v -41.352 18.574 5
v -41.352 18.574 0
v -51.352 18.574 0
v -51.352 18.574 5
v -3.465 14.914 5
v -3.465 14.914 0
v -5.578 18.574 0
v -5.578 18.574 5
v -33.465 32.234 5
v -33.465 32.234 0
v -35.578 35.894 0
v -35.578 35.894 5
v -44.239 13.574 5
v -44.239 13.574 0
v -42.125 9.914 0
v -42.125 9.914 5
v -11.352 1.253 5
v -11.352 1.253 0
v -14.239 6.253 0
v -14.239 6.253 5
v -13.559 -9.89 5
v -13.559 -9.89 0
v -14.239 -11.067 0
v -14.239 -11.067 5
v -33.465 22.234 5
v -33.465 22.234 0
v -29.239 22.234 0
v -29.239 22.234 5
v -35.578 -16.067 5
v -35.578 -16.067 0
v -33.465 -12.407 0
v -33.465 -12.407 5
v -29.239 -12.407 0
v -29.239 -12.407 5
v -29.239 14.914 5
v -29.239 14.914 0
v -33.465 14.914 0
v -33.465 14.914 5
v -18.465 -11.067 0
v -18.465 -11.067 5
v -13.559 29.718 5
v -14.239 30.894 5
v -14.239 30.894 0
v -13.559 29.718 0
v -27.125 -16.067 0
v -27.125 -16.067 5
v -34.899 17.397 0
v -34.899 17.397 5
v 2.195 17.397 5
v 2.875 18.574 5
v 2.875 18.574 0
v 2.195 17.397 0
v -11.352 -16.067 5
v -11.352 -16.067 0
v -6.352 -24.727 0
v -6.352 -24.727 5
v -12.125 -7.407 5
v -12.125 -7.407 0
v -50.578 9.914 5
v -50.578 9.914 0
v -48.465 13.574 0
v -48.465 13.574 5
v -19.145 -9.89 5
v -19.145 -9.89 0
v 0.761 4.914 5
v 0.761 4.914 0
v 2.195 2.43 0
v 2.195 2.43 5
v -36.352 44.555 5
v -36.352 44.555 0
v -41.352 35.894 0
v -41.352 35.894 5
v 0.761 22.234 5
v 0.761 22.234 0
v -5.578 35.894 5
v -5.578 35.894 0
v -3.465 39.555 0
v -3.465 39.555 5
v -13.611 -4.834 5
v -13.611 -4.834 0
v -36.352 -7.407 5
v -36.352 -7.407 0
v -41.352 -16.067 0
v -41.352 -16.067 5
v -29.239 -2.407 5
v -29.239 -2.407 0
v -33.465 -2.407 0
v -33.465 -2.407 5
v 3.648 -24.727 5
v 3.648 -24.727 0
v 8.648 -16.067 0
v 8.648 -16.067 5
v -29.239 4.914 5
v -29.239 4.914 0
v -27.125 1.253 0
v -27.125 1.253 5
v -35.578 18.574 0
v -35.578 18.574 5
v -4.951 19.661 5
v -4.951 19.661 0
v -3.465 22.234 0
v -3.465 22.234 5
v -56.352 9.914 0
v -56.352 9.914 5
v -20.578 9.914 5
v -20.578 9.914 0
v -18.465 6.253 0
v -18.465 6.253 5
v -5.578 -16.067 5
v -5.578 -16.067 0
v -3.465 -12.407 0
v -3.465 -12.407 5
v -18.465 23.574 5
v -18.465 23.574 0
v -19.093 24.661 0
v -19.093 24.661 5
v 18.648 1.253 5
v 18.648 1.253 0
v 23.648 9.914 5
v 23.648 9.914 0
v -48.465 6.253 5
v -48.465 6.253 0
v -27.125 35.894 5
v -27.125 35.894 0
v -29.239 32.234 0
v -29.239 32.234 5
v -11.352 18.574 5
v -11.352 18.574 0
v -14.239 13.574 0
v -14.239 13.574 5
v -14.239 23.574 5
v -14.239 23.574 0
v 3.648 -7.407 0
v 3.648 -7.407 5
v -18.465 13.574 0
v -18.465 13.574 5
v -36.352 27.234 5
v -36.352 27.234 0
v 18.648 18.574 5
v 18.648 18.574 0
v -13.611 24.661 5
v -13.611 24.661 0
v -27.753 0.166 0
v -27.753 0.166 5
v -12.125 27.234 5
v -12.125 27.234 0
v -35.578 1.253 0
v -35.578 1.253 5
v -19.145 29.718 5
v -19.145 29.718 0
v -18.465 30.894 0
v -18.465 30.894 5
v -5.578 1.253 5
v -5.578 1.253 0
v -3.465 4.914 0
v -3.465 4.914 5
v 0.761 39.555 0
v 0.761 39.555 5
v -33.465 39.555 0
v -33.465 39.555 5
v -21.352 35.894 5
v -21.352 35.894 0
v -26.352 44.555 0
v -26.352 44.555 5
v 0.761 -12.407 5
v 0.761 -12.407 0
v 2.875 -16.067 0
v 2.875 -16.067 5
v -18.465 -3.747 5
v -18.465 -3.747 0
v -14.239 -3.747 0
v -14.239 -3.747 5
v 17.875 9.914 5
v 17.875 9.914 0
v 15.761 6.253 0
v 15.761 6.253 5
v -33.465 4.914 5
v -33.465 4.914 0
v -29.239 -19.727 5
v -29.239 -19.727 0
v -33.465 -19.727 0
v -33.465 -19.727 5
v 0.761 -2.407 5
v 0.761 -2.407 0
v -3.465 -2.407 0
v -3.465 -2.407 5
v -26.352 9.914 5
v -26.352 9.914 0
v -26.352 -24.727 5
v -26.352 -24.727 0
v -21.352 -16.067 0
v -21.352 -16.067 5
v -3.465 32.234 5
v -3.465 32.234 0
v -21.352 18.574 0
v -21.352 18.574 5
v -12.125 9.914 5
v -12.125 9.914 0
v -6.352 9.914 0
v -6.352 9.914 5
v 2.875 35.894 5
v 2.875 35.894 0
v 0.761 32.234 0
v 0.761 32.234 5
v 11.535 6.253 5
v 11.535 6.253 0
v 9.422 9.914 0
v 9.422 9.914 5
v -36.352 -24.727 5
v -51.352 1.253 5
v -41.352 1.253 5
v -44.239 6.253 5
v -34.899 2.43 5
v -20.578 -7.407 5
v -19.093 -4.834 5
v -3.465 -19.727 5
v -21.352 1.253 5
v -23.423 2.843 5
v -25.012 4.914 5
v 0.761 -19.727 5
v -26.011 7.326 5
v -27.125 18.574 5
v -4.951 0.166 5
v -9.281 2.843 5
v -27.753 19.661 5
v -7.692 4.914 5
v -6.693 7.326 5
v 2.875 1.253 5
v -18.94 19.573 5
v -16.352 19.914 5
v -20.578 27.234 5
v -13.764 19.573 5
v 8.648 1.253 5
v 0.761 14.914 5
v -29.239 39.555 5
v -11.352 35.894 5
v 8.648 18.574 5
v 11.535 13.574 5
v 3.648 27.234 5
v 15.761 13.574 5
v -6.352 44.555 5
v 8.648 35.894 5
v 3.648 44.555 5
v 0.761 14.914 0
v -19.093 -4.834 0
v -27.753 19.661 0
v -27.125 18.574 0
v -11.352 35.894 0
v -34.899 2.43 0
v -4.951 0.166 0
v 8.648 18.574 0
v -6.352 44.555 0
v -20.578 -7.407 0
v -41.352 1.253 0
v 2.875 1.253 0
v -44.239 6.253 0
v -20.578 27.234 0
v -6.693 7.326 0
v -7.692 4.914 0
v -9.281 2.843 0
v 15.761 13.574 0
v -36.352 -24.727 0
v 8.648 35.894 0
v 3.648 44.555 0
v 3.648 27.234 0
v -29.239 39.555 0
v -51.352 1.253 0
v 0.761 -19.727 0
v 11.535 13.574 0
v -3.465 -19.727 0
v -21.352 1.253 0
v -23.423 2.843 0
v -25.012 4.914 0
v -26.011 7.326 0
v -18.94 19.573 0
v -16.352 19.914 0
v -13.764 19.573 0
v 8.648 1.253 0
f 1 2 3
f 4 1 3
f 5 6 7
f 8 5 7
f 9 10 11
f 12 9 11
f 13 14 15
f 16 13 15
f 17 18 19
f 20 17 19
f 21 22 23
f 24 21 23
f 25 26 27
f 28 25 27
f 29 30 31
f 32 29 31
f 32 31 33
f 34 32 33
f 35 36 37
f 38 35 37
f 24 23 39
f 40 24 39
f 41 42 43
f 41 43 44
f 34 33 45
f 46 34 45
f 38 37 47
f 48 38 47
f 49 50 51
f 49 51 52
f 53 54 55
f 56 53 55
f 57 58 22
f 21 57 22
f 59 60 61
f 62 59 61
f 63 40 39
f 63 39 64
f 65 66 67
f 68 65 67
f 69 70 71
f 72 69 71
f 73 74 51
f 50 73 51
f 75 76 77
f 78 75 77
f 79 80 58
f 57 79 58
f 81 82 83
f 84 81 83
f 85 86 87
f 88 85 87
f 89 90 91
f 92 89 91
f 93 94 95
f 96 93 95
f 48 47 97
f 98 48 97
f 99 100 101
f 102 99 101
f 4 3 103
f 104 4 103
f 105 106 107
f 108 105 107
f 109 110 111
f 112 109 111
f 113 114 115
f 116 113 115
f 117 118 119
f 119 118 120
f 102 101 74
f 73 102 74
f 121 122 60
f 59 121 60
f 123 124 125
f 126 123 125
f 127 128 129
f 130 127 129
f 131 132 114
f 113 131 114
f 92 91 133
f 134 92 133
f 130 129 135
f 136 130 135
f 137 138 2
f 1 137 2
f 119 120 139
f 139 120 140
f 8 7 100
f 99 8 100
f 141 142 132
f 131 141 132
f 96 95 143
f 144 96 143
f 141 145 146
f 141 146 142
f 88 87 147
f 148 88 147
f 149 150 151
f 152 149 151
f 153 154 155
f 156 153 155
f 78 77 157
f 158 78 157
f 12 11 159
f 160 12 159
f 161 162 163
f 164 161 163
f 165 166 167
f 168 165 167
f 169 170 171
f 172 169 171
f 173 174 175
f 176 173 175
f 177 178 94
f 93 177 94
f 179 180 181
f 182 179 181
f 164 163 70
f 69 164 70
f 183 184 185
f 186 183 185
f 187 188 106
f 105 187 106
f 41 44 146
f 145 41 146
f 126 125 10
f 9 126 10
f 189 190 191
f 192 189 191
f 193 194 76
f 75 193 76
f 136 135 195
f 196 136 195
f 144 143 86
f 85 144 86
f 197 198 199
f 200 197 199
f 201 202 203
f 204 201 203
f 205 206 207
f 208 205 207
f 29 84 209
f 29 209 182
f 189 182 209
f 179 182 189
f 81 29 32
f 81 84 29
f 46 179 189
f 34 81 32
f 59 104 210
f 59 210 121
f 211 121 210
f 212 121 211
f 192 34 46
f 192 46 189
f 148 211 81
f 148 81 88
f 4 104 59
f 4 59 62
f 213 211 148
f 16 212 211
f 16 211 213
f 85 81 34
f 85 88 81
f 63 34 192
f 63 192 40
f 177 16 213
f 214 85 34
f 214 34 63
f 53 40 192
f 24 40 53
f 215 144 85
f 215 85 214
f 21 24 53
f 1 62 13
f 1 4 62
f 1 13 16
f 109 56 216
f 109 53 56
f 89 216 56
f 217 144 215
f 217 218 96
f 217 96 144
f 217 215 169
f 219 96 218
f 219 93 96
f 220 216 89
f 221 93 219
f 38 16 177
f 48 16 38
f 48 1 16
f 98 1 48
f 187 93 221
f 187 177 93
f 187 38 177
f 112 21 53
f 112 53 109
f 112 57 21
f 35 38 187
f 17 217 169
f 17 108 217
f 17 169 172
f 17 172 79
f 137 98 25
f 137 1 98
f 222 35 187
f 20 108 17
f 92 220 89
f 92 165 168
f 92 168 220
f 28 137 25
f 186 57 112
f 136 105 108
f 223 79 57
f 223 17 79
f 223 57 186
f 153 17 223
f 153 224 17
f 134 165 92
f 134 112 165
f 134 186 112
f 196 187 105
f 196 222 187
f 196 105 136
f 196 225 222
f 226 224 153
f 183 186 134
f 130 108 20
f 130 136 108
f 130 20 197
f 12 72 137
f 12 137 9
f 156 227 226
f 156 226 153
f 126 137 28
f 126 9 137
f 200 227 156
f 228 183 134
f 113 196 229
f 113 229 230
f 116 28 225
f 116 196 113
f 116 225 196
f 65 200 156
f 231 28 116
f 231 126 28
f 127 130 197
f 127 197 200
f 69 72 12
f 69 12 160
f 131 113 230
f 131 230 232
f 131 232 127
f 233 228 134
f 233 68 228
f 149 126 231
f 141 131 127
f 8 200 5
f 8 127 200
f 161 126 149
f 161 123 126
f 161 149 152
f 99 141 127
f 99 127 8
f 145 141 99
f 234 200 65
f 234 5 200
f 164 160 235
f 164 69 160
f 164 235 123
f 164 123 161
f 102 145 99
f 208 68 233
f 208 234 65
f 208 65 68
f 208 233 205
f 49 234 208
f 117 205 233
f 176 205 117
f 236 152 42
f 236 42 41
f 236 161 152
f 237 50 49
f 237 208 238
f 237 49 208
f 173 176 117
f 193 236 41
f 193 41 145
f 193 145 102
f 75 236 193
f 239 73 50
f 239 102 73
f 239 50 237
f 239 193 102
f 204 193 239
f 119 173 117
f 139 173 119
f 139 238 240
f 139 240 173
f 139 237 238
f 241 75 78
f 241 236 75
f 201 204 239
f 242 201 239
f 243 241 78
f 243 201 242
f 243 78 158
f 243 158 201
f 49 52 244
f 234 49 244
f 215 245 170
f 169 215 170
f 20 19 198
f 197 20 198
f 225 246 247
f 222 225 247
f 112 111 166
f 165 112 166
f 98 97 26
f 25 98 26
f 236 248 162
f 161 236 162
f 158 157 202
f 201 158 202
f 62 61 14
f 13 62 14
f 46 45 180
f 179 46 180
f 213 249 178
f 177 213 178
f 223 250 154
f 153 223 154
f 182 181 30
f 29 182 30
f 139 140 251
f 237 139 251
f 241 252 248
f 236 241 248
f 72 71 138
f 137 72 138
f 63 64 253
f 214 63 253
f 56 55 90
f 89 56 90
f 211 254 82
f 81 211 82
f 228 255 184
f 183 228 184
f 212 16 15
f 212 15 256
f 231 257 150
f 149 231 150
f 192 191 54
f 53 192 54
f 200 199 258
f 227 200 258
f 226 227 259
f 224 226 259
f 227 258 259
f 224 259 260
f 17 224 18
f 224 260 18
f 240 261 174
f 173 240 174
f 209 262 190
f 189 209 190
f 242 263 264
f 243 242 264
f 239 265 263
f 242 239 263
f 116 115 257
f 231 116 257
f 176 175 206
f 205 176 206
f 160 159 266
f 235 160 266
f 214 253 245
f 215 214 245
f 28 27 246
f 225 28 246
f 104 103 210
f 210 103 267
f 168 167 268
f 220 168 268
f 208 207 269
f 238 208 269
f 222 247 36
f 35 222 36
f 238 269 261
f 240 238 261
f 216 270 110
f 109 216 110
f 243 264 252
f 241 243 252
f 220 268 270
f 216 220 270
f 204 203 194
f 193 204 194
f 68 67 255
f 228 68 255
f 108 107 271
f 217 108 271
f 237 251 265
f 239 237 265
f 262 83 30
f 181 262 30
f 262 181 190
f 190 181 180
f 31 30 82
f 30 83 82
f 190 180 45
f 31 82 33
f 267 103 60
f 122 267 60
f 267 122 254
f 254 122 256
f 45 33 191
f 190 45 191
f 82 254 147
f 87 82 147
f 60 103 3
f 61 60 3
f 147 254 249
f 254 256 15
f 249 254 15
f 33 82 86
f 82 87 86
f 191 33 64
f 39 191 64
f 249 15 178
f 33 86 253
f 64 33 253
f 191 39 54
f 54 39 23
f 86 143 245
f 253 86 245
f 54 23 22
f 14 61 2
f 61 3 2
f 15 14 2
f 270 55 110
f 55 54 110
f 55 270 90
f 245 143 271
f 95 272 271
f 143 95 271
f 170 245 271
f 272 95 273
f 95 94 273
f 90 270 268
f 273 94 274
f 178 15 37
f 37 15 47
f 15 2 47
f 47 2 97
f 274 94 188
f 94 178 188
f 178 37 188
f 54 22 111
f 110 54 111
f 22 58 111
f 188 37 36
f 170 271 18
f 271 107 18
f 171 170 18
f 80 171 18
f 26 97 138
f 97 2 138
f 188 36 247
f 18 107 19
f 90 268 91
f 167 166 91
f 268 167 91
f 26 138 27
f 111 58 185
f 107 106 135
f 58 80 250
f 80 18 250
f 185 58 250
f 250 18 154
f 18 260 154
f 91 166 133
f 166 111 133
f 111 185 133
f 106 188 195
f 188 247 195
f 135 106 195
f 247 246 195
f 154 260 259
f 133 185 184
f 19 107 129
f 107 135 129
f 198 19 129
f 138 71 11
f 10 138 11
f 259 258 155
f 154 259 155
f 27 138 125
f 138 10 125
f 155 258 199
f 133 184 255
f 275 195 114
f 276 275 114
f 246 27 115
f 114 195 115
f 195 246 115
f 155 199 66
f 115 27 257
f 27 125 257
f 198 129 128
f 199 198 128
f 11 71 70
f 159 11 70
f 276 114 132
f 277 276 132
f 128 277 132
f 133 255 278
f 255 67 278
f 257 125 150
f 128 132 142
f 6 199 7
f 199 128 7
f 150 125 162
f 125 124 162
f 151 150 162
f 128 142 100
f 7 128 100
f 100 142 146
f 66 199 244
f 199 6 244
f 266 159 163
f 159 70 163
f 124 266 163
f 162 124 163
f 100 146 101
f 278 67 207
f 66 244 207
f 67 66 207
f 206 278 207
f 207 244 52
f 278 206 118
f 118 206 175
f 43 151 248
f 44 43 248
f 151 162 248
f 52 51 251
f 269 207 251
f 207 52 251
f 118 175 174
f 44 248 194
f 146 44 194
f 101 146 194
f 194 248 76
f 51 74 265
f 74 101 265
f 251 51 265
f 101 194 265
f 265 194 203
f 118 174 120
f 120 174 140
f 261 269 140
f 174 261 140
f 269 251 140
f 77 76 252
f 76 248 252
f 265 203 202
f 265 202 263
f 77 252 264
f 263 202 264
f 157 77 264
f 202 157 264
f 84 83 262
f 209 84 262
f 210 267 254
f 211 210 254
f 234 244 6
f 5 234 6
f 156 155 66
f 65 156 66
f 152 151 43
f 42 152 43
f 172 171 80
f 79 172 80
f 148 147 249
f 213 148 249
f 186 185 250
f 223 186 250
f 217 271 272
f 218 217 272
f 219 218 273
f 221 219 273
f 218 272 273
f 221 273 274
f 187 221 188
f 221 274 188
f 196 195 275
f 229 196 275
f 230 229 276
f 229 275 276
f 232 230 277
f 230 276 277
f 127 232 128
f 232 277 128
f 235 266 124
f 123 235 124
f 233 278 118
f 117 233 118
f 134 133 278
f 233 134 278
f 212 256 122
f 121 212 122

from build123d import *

# Parameters (mm, degrees)
F1_DEPTH = 5


with BuildPart() as f1:
    # F0 (on Top) → F1 (new body)
    with BuildSketch(Plane.XY):
        with BuildLine():
            Line((-11.351928, -16.06705), (-6.351928, -7.406796))
            ThreePointArc((-6.351928, -7.406796), (-9.836197, -8.995155), (-13.559318, -9.890362))
            Line((-13.559318, -9.890362), (-14.238679, -11.06705))
            Line((-14.238679, -11.06705), (-18.465176, -11.06705))
            Line((-18.465176, -11.06705), (-19.144538, -9.890362))
            ThreePointArc((-19.144538, -9.890362), (-22.867658, -8.995155), (-26.351928, -7.406796))
            Line((-26.351928, -7.406796), (-21.351928, -16.06705))
            Line((-21.351928, -16.06705), (-11.351928, -16.06705))
        make_face()
        Polygon((-21.351928, 18.573966), (-26.351928, 9.913712), (-20.578425, 9.913712), (-18.465176, 13.573966), align=None)
        with BuildLine():
            Line((-41.351928, 18.573966), (-36.351928, 9.913712))
            ThreePointArc((-36.351928, 9.913712), (-35.985352, 13.725357), (-34.899064, 17.397277))
            Line((-34.899064, 17.397277), (-35.578425, 18.573966))
            Line((-35.578425, 18.573966), (-33.465176, 22.23422))
            Line((-33.465176, 22.23422), (-32.106454, 22.23422))
            ThreePointArc((-32.106454, 22.23422), (-29.469622, 25.010934), (-26.351928, 27.23422))
            Line((-26.351928, 27.23422), (-36.351928, 27.23422))
            Line((-36.351928, 27.23422), (-41.351928, 18.573966))
        make_face()
        Polygon((-36.351928, 27.23422), (-26.351928, 27.23422), (-21.351928, 35.894474), (-26.351928, 44.554728), (-36.351928, 44.554728), (-41.351928, 35.894474), align=None)
        Polygon((-33.465176, 39.554728), (-29.238679, 39.554728), (-27.12543, 35.894474), (-29.238679, 32.23422), (-33.465176, 32.23422), (-35.578425, 35.894474), align=None, mode=Mode.SUBTRACT)
        Polygon((-41.351928, 1.253458), (-36.351928, 9.913712), (-41.351928, 18.573966), (-51.351928, 18.573966), (-56.351928, 9.913712), (-51.351928, 1.253458), align=None)
        Polygon((-50.578425, 9.913712), (-48.465176, 13.573966), (-44.238679, 13.573966), (-42.12543, 9.913712), (-44.238679, 6.253458), (-48.465176, 6.253458), align=None, mode=Mode.SUBTRACT)
        with BuildLine():
            ThreePointArc((-11.351928, 18.573966), (-7.691674, 14.913712), (-6.351928, 9.913712))
            Line((-6.351928, 9.913712), (-1.351928, 9.913712))
            ThreePointArc((-1.351928, 9.913712), (-1.567949, 12.450242), (-2.209792, 14.913712))
            Line((-2.209792, 14.913712), (-3.465176, 14.913712))
            Line((-3.465176, 14.913712), (-5.578425, 18.573966))
            Line((-5.578425, 18.573966), (-4.950733, 19.661161))
            ThreePointArc((-4.950733, 19.661161), (-6.763239, 21.448748), (-8.851928, 22.904093))
            Line((-8.851928, 22.904093), (-11.351928, 18.573966))
        make_face()
        Polygon((-11.351928, 35.894474), (-6.351928, 27.23422), (3.648072, 27.23422), (8.648072, 35.894474), (3.648072, 44.554728), (-6.351928, 44.554728), align=None)
        Polygon((-5.578425, 35.894474), (-3.465176, 39.554728), (0.761321, 39.554728), (2.87457, 35.894474), (0.761321, 32.23422), (-3.465176, 32.23422), align=None, mode=Mode.SUBTRACT)
        Polygon((8.648072, 18.573966), (3.648072, 9.913712), (8.648072, 1.253458), (18.648072, 1.253458), (23.648072, 9.913712), (18.648072, 18.573966), align=None)
        Polygon((15.761321, 13.573966), (17.87457, 9.913712), (15.761321, 6.253458), (11.534824, 6.253458), (9.421575, 9.913712), (11.534824, 13.573966), align=None, mode=Mode.SUBTRACT)
        Polygon((-12.12543, 9.913712), (-6.351928, 9.913712), (-11.351928, 18.573966), (-14.238679, 13.573966), align=None)
        Polygon((3.648072, -7.406796), (-6.351928, -7.406796), (-11.351928, -16.06705), (-6.351928, -24.727304), (3.648072, -24.727304), (8.648072, -16.06705), align=None)
        Polygon((0.761321, -12.406796), (2.874569, -16.06705), (0.761321, -19.727304), (-3.465176, -19.727304), (-5.578425, -16.06705), (-3.465176, -12.406796), align=None, mode=Mode.SUBTRACT)
        with BuildLine():
            Line((-31.351928, 9.913712), (-26.351928, 9.913712))
            ThreePointArc((-26.351928, 9.913712), (-25.012182, 14.913712), (-21.351928, 18.573966))
            Line((-21.351928, 18.573966), (-23.851928, 22.904093))
            ThreePointArc((-23.851928, 22.904093), (-25.940616, 21.448748), (-27.753123, 19.661161))
            Line((-27.753123, 19.661161), (-27.12543, 18.573966))
            Line((-27.12543, 18.573966), (-29.238679, 14.913712))
            Line((-29.238679, 14.913712), (-30.494063, 14.913712))
            ThreePointArc((-30.494063, 14.913712), (-31.135906, 12.450242), (-31.351928, 9.913712))
        make_face()
        Polygon((-21.351928, -16.06705), (-26.351928, -7.406796), (-36.351928, -7.406796), (-41.351928, -16.06705), (-36.351928, -24.727304), (-26.351928, -24.727304), align=None)
        Polygon((-33.465176, -19.727304), (-35.578425, -16.06705), (-33.465176, -12.406796), (-29.238679, -12.406796), (-27.12543, -16.06705), (-29.238679, -19.727304), align=None, mode=Mode.SUBTRACT)
        with BuildLine():
            Line((-36.351928, -7.406796), (-26.351928, -7.406796))
            ThreePointArc((-26.351928, -7.406796), (-29.469622, -5.18351), (-32.106454, -2.406796))
            Line((-32.106454, -2.406796), (-33.465176, -2.406796))
            Line((-33.465176, -2.406796), (-35.578425, 1.253458))
            Line((-35.578425, 1.253458), (-34.899064, 2.430146))
            ThreePointArc((-34.899064, 2.430146), (-35.985352, 6.102066), (-36.351928, 9.913712))
            Line((-36.351928, 9.913712), (-41.351928, 1.253458))
            Line((-41.351928, 1.253458), (-36.351928, -7.406796))
        make_face()
        with BuildLine():
            ThreePointArc((2.195208, 17.397277), (3.281497, 13.725357), (3.648072, 9.913712))
            Line((3.648072, 9.913712), (8.648072, 18.573966))
            Line((8.648072, 18.573966), (3.648072, 27.23422))
            Line((3.648072, 27.23422), (-6.351928, 27.23422))
            ThreePointArc((-6.351928, 27.23422), (-3.234234, 25.010934), (-0.597402, 22.23422))
            Line((-0.597402, 22.23422), (0.761321, 22.23422))
            Line((0.761321, 22.23422), (2.87457, 18.573966))
            Line((2.87457, 18.573966), (2.195208, 17.397277))
        make_face()
        with BuildLine():
            ThreePointArc((-13.559318, 29.717785), (-9.836197, 28.822579), (-6.351928, 27.23422))
            Line((-6.351928, 27.23422), (-11.351928, 35.894474))
            Line((-11.351928, 35.894474), (-21.351928, 35.894474))
            Line((-21.351928, 35.894474), (-26.351928, 27.23422))
            ThreePointArc((-26.351928, 27.23422), (-22.867658, 28.822579), (-19.144538, 29.717785))
            Line((-19.144538, 29.717785), (-18.465176, 30.894474))
            Line((-18.465176, 30.894474), (-14.238679, 30.894474))
            Line((-14.238679, 30.894474), (-13.559318, 29.717785))
        make_face()
        with BuildLine():
            ThreePointArc((-0.597402, -2.406796), (-3.234234, -5.18351), (-6.351928, -7.406796))
            Line((-6.351928, -7.406796), (3.648072, -7.406796))
            Line((3.648072, -7.406796), (8.648072, 1.253458))
            Line((8.648072, 1.253458), (3.648072, 9.913712))
            ThreePointArc((3.648072, 9.913712), (3.281497, 6.102066), (2.195208, 2.430146))
            Line((2.195208, 2.430146), (2.87457, 1.253458))
            Line((2.87457, 1.253458), (0.761321, -2.406796))
            Line((0.761321, -2.406796), (-0.597402, -2.406796))
        make_face()
        with BuildLine():
            Line((-26.351928, 27.23422), (-23.851928, 22.904093))
            ThreePointArc((-23.851928, 22.904093), (-21.547218, 23.985278), (-19.092869, 24.661161))
            Line((-19.092869, 24.661161), (-20.578425, 27.23422))
            Line((-20.578425, 27.23422), (-19.144538, 29.717785))
            ThreePointArc((-19.144538, 29.717785), (-22.867658, 28.822579), (-26.351928, 27.23422))
        make_face()
        with BuildLine():
            ThreePointArc((-30.494063, 4.913712), (-31.135906, 7.377182), (-31.351928, 9.913712))
            Line((-31.351928, 9.913712), (-36.351928, 9.913712))
            ThreePointArc((-36.351928, 9.913712), (-35.985352, 6.102066), (-34.899064, 2.430146))
            Line((-34.899064, 2.430146), (-33.465176, 4.913712))
            Line((-33.465176, 4.913712), (-30.494063, 4.913712))
        make_face()
        with BuildLine():
            ThreePointArc((-6.351928, 9.913712), (-7.691674, 4.913712), (-11.351928, 1.253458))
            Line((-11.351928, 1.253458), (-8.851928, -3.076669))
            ThreePointArc((-8.851928, -3.076669), (-6.763239, -1.621324), (-4.950733, 0.166263))
            Line((-4.950733, 0.166263), (-5.578425, 1.253458))
            Line((-5.578425, 1.253458), (-3.465176, 4.913712))
            Line((-3.465176, 4.913712), (-2.209792, 4.913712))
            ThreePointArc((-2.209792, 4.913712), (-1.567949, 7.377182), (-1.351928, 9.913712))
            Line((-1.351928, 9.913712), (-6.351928, 9.913712))
        make_face()
        with BuildLine():
            Line((-36.351928, 9.913712), (-31.351928, 9.913712))
            ThreePointArc((-31.351928, 9.913712), (-31.135906, 12.450242), (-30.494063, 14.913712))
            Line((-30.494063, 14.913712), (-33.465176, 14.913712))
            Line((-33.465176, 14.913712), (-34.899064, 17.397277))
            ThreePointArc((-34.899064, 17.397277), (-35.985352, 13.725357), (-36.351928, 9.913712))
        make_face()
        with BuildLine():
            Line((-8.851928, -3.076669), (-11.351928, 1.253458))
            ThreePointArc((-11.351928, 1.253458), (-16.351928, -0.086288), (-21.351928, 1.253458))
            Line((-21.351928, 1.253458), (-23.851928, -3.076669))
            ThreePointArc((-23.851928, -3.076669), (-21.547218, -4.157854), (-19.092869, -4.833737))
            Line((-19.092869, -4.833737), (-18.465176, -3.746542))
            Line((-18.465176, -3.746542), (-14.238679, -3.746542))
            Line((-14.238679, -3.746542), (-13.610987, -4.833737))
            ThreePointArc((-13.610987, -4.833737), (-11.156638, -4.157854), (-8.851928, -3.076669))
        make_face()
        with BuildLine():
            ThreePointArc((-13.610987, 24.661161), (-11.156638, 23.985278), (-8.851928, 22.904093))
            Line((-8.851928, 22.904093), (-6.351928, 27.23422))
            ThreePointArc((-6.351928, 27.23422), (-9.836197, 28.822579), (-13.559318, 29.717785))
            Line((-13.559318, 29.717785), (-12.12543, 27.23422))
            Line((-12.12543, 27.23422), (-13.610987, 24.661161))
        make_face()
        with BuildLine():
            Line((-23.851928, -3.076669), (-21.351928, 1.253458))
            ThreePointArc((-21.351928, 1.253458), (-25.012182, 4.913712), (-26.351928, 9.913712))
            Line((-26.351928, 9.913712), (-31.351928, 9.913712))
            ThreePointArc((-31.351928, 9.913712), (-31.135906, 7.377182), (-30.494063, 4.913712))
            Line((-30.494063, 4.913712), (-29.238679, 4.913712))
            Line((-29.238679, 4.913712), (-27.12543, 1.253458))
            Line((-27.12543, 1.253458), (-27.753123, 0.166263))
            ThreePointArc((-27.753123, 0.166263), (-25.940616, -1.621324), (-23.851928, -3.076669))
        make_face()
        with BuildLine():
            ThreePointArc((-21.351928, 18.573966), (-16.351928, 19.913712), (-11.351928, 18.573966))
            Line((-11.351928, 18.573966), (-8.851928, 22.904093))
            ThreePointArc((-8.851928, 22.904093), (-11.156638, 23.985278), (-13.610987, 24.661161))
            Line((-13.610987, 24.661161), (-14.238679, 23.573966))
            Line((-14.238679, 23.573966), (-18.465176, 23.573966))
            Line((-18.465176, 23.573966), (-19.092869, 24.661161))
            ThreePointArc((-19.092869, 24.661161), (-21.547218, 23.985278), (-23.851928, 22.904093))
            Line((-23.851928, 22.904093), (-21.351928, 18.573966))
        make_face()
        with BuildLine():
            Line((3.648072, 9.913712), (-1.351928, 9.913712))
            ThreePointArc((-1.351928, 9.913712), (-1.567949, 7.377182), (-2.209792, 4.913712))
            Line((-2.209792, 4.913712), (0.761321, 4.913712))
            Line((0.761321, 4.913712), (2.195208, 2.430146))
            ThreePointArc((2.195208, 2.430146), (3.281497, 6.102066), (3.648072, 9.913712))
        make_face()
        with BuildLine():
            ThreePointArc((-19.092869, -4.833737), (-21.547218, -4.157854), (-23.851928, -3.076669))
            Line((-23.851928, -3.076669), (-26.351928, -7.406796))
            ThreePointArc((-26.351928, -7.406796), (-22.867658, -8.995155), (-19.144538, -9.890362))
            Line((-19.144538, -9.890362), (-20.578425, -7.406796))
            Line((-20.578425, -7.406796), (-19.092869, -4.833737))
        make_face()
        with BuildLine():
            Line((-6.351928, -7.406796), (-8.851928, -3.076669))
            ThreePointArc((-8.851928, -3.076669), (-11.156638, -4.157854), (-13.610987, -4.833737))
            Line((-13.610987, -4.833737), (-12.12543, -7.406796))
            Line((-12.12543, -7.406796), (-13.559318, -9.890362))
            ThreePointArc((-13.559318, -9.890362), (-9.836197, -8.995155), (-6.351928, -7.406796))
        make_face()
        with BuildLine():
            ThreePointArc((-2.209792, 14.913712), (-1.567949, 12.450242), (-1.351928, 9.913712))
            Line((-1.351928, 9.913712), (3.648072, 9.913712))
            ThreePointArc((3.648072, 9.913712), (3.281497, 13.725357), (2.195208, 17.397277))
            Line((2.195208, 17.397277), (0.761321, 14.913712))
            Line((0.761321, 14.913712), (-2.209792, 14.913712))
        make_face()
        with BuildLine():
            Line((-26.351928, -7.406796), (-23.851928, -3.076669))
            ThreePointArc((-23.851928, -3.076669), (-25.940616, -1.621324), (-27.753123, 0.166263))
            Line((-27.753123, 0.166263), (-29.238679, -2.406796))
            Line((-29.238679, -2.406796), (-32.106454, -2.406796))
            ThreePointArc((-32.106454, -2.406796), (-29.469622, -5.18351), (-26.351928, -7.406796))
        make_face()
        with BuildLine():
            Line((-6.351928, 27.23422), (-8.851928, 22.904093))
            ThreePointArc((-8.851928, 22.904093), (-6.763239, 21.448748), (-4.950733, 19.661161))
            Line((-4.950733, 19.661161), (-3.465176, 22.23422))
            Line((-3.465176, 22.23422), (-0.597402, 22.23422))
            ThreePointArc((-0.597402, 22.23422), (-3.234234, 25.010934), (-6.351928, 27.23422))
        make_face()
        with BuildLine():
            ThreePointArc((-27.753123, 19.661161), (-25.940616, 21.448748), (-23.851928, 22.904093))
            Line((-23.851928, 22.904093), (-26.351928, 27.23422))
            ThreePointArc((-26.351928, 27.23422), (-29.469622, 25.010934), (-32.106454, 22.23422))
            Line((-32.106454, 22.23422), (-29.238679, 22.23422))
            Line((-29.238679, 22.23422), (-27.753123, 19.661161))
        make_face()
        Polygon((-21.351928, 1.253458), (-11.351928, 1.253458), (-14.238679, 6.253458), (-18.465176, 6.253458), align=None)
        with BuildLine():
            ThreePointArc((-4.950733, 0.166263), (-6.763239, -1.621324), (-8.851928, -3.076669))
            Line((-8.851928, -3.076669), (-6.351928, -7.406796))
            ThreePointArc((-6.351928, -7.406796), (-3.234234, -5.18351), (-0.597402, -2.406796))
            Line((-0.597402, -2.406796), (-3.465176, -2.406796))
            Line((-3.465176, -2.406796), (-4.950733, 0.166263))
        make_face()
        Polygon((-16.351928, 9.913712), (-12.12543, 9.913712), (-14.238679, 13.573966), align=None)
        Polygon((-18.465176, 13.573966), (-16.351928, 9.913712), (-14.238679, 13.573966), align=None)
        Polygon((-20.578425, 9.913712), (-16.351928, 9.913712), (-18.465176, 13.573966), align=None)
        Polygon((-16.351928, 9.913712), (-14.238679, 6.253458), (-12.12543, 9.913712), align=None)
        Polygon((-20.578425, 9.913712), (-18.465176, 6.253458), (-16.351928, 9.913712), align=None)
        Polygon((-18.465176, 6.253458), (-14.238679, 6.253458), (-16.351928, 9.913712), align=None)
        with BuildLine():
            ThreePointArc((-21.351928, 18.573966), (-25.012182, 14.913712), (-26.351928, 9.913712))
            Line((-26.351928, 9.913712), (-21.351928, 18.573966))
        make_face()
        with BuildLine():
            ThreePointArc((-21.351928, 1.253458), (-16.351928, -0.086288), (-11.351928, 1.253458))
            Line((-11.351928, 1.253458), (-21.351928, 1.253458))
        make_face()
        with BuildLine():
            Line((-11.351928, 18.573966), (-6.351928, 9.913712))
            ThreePointArc((-6.351928, 9.913712), (-7.691674, 14.913712), (-11.351928, 18.573966))
        make_face()
    extrude(amount=F1_DEPTH)


solid = f1.part
